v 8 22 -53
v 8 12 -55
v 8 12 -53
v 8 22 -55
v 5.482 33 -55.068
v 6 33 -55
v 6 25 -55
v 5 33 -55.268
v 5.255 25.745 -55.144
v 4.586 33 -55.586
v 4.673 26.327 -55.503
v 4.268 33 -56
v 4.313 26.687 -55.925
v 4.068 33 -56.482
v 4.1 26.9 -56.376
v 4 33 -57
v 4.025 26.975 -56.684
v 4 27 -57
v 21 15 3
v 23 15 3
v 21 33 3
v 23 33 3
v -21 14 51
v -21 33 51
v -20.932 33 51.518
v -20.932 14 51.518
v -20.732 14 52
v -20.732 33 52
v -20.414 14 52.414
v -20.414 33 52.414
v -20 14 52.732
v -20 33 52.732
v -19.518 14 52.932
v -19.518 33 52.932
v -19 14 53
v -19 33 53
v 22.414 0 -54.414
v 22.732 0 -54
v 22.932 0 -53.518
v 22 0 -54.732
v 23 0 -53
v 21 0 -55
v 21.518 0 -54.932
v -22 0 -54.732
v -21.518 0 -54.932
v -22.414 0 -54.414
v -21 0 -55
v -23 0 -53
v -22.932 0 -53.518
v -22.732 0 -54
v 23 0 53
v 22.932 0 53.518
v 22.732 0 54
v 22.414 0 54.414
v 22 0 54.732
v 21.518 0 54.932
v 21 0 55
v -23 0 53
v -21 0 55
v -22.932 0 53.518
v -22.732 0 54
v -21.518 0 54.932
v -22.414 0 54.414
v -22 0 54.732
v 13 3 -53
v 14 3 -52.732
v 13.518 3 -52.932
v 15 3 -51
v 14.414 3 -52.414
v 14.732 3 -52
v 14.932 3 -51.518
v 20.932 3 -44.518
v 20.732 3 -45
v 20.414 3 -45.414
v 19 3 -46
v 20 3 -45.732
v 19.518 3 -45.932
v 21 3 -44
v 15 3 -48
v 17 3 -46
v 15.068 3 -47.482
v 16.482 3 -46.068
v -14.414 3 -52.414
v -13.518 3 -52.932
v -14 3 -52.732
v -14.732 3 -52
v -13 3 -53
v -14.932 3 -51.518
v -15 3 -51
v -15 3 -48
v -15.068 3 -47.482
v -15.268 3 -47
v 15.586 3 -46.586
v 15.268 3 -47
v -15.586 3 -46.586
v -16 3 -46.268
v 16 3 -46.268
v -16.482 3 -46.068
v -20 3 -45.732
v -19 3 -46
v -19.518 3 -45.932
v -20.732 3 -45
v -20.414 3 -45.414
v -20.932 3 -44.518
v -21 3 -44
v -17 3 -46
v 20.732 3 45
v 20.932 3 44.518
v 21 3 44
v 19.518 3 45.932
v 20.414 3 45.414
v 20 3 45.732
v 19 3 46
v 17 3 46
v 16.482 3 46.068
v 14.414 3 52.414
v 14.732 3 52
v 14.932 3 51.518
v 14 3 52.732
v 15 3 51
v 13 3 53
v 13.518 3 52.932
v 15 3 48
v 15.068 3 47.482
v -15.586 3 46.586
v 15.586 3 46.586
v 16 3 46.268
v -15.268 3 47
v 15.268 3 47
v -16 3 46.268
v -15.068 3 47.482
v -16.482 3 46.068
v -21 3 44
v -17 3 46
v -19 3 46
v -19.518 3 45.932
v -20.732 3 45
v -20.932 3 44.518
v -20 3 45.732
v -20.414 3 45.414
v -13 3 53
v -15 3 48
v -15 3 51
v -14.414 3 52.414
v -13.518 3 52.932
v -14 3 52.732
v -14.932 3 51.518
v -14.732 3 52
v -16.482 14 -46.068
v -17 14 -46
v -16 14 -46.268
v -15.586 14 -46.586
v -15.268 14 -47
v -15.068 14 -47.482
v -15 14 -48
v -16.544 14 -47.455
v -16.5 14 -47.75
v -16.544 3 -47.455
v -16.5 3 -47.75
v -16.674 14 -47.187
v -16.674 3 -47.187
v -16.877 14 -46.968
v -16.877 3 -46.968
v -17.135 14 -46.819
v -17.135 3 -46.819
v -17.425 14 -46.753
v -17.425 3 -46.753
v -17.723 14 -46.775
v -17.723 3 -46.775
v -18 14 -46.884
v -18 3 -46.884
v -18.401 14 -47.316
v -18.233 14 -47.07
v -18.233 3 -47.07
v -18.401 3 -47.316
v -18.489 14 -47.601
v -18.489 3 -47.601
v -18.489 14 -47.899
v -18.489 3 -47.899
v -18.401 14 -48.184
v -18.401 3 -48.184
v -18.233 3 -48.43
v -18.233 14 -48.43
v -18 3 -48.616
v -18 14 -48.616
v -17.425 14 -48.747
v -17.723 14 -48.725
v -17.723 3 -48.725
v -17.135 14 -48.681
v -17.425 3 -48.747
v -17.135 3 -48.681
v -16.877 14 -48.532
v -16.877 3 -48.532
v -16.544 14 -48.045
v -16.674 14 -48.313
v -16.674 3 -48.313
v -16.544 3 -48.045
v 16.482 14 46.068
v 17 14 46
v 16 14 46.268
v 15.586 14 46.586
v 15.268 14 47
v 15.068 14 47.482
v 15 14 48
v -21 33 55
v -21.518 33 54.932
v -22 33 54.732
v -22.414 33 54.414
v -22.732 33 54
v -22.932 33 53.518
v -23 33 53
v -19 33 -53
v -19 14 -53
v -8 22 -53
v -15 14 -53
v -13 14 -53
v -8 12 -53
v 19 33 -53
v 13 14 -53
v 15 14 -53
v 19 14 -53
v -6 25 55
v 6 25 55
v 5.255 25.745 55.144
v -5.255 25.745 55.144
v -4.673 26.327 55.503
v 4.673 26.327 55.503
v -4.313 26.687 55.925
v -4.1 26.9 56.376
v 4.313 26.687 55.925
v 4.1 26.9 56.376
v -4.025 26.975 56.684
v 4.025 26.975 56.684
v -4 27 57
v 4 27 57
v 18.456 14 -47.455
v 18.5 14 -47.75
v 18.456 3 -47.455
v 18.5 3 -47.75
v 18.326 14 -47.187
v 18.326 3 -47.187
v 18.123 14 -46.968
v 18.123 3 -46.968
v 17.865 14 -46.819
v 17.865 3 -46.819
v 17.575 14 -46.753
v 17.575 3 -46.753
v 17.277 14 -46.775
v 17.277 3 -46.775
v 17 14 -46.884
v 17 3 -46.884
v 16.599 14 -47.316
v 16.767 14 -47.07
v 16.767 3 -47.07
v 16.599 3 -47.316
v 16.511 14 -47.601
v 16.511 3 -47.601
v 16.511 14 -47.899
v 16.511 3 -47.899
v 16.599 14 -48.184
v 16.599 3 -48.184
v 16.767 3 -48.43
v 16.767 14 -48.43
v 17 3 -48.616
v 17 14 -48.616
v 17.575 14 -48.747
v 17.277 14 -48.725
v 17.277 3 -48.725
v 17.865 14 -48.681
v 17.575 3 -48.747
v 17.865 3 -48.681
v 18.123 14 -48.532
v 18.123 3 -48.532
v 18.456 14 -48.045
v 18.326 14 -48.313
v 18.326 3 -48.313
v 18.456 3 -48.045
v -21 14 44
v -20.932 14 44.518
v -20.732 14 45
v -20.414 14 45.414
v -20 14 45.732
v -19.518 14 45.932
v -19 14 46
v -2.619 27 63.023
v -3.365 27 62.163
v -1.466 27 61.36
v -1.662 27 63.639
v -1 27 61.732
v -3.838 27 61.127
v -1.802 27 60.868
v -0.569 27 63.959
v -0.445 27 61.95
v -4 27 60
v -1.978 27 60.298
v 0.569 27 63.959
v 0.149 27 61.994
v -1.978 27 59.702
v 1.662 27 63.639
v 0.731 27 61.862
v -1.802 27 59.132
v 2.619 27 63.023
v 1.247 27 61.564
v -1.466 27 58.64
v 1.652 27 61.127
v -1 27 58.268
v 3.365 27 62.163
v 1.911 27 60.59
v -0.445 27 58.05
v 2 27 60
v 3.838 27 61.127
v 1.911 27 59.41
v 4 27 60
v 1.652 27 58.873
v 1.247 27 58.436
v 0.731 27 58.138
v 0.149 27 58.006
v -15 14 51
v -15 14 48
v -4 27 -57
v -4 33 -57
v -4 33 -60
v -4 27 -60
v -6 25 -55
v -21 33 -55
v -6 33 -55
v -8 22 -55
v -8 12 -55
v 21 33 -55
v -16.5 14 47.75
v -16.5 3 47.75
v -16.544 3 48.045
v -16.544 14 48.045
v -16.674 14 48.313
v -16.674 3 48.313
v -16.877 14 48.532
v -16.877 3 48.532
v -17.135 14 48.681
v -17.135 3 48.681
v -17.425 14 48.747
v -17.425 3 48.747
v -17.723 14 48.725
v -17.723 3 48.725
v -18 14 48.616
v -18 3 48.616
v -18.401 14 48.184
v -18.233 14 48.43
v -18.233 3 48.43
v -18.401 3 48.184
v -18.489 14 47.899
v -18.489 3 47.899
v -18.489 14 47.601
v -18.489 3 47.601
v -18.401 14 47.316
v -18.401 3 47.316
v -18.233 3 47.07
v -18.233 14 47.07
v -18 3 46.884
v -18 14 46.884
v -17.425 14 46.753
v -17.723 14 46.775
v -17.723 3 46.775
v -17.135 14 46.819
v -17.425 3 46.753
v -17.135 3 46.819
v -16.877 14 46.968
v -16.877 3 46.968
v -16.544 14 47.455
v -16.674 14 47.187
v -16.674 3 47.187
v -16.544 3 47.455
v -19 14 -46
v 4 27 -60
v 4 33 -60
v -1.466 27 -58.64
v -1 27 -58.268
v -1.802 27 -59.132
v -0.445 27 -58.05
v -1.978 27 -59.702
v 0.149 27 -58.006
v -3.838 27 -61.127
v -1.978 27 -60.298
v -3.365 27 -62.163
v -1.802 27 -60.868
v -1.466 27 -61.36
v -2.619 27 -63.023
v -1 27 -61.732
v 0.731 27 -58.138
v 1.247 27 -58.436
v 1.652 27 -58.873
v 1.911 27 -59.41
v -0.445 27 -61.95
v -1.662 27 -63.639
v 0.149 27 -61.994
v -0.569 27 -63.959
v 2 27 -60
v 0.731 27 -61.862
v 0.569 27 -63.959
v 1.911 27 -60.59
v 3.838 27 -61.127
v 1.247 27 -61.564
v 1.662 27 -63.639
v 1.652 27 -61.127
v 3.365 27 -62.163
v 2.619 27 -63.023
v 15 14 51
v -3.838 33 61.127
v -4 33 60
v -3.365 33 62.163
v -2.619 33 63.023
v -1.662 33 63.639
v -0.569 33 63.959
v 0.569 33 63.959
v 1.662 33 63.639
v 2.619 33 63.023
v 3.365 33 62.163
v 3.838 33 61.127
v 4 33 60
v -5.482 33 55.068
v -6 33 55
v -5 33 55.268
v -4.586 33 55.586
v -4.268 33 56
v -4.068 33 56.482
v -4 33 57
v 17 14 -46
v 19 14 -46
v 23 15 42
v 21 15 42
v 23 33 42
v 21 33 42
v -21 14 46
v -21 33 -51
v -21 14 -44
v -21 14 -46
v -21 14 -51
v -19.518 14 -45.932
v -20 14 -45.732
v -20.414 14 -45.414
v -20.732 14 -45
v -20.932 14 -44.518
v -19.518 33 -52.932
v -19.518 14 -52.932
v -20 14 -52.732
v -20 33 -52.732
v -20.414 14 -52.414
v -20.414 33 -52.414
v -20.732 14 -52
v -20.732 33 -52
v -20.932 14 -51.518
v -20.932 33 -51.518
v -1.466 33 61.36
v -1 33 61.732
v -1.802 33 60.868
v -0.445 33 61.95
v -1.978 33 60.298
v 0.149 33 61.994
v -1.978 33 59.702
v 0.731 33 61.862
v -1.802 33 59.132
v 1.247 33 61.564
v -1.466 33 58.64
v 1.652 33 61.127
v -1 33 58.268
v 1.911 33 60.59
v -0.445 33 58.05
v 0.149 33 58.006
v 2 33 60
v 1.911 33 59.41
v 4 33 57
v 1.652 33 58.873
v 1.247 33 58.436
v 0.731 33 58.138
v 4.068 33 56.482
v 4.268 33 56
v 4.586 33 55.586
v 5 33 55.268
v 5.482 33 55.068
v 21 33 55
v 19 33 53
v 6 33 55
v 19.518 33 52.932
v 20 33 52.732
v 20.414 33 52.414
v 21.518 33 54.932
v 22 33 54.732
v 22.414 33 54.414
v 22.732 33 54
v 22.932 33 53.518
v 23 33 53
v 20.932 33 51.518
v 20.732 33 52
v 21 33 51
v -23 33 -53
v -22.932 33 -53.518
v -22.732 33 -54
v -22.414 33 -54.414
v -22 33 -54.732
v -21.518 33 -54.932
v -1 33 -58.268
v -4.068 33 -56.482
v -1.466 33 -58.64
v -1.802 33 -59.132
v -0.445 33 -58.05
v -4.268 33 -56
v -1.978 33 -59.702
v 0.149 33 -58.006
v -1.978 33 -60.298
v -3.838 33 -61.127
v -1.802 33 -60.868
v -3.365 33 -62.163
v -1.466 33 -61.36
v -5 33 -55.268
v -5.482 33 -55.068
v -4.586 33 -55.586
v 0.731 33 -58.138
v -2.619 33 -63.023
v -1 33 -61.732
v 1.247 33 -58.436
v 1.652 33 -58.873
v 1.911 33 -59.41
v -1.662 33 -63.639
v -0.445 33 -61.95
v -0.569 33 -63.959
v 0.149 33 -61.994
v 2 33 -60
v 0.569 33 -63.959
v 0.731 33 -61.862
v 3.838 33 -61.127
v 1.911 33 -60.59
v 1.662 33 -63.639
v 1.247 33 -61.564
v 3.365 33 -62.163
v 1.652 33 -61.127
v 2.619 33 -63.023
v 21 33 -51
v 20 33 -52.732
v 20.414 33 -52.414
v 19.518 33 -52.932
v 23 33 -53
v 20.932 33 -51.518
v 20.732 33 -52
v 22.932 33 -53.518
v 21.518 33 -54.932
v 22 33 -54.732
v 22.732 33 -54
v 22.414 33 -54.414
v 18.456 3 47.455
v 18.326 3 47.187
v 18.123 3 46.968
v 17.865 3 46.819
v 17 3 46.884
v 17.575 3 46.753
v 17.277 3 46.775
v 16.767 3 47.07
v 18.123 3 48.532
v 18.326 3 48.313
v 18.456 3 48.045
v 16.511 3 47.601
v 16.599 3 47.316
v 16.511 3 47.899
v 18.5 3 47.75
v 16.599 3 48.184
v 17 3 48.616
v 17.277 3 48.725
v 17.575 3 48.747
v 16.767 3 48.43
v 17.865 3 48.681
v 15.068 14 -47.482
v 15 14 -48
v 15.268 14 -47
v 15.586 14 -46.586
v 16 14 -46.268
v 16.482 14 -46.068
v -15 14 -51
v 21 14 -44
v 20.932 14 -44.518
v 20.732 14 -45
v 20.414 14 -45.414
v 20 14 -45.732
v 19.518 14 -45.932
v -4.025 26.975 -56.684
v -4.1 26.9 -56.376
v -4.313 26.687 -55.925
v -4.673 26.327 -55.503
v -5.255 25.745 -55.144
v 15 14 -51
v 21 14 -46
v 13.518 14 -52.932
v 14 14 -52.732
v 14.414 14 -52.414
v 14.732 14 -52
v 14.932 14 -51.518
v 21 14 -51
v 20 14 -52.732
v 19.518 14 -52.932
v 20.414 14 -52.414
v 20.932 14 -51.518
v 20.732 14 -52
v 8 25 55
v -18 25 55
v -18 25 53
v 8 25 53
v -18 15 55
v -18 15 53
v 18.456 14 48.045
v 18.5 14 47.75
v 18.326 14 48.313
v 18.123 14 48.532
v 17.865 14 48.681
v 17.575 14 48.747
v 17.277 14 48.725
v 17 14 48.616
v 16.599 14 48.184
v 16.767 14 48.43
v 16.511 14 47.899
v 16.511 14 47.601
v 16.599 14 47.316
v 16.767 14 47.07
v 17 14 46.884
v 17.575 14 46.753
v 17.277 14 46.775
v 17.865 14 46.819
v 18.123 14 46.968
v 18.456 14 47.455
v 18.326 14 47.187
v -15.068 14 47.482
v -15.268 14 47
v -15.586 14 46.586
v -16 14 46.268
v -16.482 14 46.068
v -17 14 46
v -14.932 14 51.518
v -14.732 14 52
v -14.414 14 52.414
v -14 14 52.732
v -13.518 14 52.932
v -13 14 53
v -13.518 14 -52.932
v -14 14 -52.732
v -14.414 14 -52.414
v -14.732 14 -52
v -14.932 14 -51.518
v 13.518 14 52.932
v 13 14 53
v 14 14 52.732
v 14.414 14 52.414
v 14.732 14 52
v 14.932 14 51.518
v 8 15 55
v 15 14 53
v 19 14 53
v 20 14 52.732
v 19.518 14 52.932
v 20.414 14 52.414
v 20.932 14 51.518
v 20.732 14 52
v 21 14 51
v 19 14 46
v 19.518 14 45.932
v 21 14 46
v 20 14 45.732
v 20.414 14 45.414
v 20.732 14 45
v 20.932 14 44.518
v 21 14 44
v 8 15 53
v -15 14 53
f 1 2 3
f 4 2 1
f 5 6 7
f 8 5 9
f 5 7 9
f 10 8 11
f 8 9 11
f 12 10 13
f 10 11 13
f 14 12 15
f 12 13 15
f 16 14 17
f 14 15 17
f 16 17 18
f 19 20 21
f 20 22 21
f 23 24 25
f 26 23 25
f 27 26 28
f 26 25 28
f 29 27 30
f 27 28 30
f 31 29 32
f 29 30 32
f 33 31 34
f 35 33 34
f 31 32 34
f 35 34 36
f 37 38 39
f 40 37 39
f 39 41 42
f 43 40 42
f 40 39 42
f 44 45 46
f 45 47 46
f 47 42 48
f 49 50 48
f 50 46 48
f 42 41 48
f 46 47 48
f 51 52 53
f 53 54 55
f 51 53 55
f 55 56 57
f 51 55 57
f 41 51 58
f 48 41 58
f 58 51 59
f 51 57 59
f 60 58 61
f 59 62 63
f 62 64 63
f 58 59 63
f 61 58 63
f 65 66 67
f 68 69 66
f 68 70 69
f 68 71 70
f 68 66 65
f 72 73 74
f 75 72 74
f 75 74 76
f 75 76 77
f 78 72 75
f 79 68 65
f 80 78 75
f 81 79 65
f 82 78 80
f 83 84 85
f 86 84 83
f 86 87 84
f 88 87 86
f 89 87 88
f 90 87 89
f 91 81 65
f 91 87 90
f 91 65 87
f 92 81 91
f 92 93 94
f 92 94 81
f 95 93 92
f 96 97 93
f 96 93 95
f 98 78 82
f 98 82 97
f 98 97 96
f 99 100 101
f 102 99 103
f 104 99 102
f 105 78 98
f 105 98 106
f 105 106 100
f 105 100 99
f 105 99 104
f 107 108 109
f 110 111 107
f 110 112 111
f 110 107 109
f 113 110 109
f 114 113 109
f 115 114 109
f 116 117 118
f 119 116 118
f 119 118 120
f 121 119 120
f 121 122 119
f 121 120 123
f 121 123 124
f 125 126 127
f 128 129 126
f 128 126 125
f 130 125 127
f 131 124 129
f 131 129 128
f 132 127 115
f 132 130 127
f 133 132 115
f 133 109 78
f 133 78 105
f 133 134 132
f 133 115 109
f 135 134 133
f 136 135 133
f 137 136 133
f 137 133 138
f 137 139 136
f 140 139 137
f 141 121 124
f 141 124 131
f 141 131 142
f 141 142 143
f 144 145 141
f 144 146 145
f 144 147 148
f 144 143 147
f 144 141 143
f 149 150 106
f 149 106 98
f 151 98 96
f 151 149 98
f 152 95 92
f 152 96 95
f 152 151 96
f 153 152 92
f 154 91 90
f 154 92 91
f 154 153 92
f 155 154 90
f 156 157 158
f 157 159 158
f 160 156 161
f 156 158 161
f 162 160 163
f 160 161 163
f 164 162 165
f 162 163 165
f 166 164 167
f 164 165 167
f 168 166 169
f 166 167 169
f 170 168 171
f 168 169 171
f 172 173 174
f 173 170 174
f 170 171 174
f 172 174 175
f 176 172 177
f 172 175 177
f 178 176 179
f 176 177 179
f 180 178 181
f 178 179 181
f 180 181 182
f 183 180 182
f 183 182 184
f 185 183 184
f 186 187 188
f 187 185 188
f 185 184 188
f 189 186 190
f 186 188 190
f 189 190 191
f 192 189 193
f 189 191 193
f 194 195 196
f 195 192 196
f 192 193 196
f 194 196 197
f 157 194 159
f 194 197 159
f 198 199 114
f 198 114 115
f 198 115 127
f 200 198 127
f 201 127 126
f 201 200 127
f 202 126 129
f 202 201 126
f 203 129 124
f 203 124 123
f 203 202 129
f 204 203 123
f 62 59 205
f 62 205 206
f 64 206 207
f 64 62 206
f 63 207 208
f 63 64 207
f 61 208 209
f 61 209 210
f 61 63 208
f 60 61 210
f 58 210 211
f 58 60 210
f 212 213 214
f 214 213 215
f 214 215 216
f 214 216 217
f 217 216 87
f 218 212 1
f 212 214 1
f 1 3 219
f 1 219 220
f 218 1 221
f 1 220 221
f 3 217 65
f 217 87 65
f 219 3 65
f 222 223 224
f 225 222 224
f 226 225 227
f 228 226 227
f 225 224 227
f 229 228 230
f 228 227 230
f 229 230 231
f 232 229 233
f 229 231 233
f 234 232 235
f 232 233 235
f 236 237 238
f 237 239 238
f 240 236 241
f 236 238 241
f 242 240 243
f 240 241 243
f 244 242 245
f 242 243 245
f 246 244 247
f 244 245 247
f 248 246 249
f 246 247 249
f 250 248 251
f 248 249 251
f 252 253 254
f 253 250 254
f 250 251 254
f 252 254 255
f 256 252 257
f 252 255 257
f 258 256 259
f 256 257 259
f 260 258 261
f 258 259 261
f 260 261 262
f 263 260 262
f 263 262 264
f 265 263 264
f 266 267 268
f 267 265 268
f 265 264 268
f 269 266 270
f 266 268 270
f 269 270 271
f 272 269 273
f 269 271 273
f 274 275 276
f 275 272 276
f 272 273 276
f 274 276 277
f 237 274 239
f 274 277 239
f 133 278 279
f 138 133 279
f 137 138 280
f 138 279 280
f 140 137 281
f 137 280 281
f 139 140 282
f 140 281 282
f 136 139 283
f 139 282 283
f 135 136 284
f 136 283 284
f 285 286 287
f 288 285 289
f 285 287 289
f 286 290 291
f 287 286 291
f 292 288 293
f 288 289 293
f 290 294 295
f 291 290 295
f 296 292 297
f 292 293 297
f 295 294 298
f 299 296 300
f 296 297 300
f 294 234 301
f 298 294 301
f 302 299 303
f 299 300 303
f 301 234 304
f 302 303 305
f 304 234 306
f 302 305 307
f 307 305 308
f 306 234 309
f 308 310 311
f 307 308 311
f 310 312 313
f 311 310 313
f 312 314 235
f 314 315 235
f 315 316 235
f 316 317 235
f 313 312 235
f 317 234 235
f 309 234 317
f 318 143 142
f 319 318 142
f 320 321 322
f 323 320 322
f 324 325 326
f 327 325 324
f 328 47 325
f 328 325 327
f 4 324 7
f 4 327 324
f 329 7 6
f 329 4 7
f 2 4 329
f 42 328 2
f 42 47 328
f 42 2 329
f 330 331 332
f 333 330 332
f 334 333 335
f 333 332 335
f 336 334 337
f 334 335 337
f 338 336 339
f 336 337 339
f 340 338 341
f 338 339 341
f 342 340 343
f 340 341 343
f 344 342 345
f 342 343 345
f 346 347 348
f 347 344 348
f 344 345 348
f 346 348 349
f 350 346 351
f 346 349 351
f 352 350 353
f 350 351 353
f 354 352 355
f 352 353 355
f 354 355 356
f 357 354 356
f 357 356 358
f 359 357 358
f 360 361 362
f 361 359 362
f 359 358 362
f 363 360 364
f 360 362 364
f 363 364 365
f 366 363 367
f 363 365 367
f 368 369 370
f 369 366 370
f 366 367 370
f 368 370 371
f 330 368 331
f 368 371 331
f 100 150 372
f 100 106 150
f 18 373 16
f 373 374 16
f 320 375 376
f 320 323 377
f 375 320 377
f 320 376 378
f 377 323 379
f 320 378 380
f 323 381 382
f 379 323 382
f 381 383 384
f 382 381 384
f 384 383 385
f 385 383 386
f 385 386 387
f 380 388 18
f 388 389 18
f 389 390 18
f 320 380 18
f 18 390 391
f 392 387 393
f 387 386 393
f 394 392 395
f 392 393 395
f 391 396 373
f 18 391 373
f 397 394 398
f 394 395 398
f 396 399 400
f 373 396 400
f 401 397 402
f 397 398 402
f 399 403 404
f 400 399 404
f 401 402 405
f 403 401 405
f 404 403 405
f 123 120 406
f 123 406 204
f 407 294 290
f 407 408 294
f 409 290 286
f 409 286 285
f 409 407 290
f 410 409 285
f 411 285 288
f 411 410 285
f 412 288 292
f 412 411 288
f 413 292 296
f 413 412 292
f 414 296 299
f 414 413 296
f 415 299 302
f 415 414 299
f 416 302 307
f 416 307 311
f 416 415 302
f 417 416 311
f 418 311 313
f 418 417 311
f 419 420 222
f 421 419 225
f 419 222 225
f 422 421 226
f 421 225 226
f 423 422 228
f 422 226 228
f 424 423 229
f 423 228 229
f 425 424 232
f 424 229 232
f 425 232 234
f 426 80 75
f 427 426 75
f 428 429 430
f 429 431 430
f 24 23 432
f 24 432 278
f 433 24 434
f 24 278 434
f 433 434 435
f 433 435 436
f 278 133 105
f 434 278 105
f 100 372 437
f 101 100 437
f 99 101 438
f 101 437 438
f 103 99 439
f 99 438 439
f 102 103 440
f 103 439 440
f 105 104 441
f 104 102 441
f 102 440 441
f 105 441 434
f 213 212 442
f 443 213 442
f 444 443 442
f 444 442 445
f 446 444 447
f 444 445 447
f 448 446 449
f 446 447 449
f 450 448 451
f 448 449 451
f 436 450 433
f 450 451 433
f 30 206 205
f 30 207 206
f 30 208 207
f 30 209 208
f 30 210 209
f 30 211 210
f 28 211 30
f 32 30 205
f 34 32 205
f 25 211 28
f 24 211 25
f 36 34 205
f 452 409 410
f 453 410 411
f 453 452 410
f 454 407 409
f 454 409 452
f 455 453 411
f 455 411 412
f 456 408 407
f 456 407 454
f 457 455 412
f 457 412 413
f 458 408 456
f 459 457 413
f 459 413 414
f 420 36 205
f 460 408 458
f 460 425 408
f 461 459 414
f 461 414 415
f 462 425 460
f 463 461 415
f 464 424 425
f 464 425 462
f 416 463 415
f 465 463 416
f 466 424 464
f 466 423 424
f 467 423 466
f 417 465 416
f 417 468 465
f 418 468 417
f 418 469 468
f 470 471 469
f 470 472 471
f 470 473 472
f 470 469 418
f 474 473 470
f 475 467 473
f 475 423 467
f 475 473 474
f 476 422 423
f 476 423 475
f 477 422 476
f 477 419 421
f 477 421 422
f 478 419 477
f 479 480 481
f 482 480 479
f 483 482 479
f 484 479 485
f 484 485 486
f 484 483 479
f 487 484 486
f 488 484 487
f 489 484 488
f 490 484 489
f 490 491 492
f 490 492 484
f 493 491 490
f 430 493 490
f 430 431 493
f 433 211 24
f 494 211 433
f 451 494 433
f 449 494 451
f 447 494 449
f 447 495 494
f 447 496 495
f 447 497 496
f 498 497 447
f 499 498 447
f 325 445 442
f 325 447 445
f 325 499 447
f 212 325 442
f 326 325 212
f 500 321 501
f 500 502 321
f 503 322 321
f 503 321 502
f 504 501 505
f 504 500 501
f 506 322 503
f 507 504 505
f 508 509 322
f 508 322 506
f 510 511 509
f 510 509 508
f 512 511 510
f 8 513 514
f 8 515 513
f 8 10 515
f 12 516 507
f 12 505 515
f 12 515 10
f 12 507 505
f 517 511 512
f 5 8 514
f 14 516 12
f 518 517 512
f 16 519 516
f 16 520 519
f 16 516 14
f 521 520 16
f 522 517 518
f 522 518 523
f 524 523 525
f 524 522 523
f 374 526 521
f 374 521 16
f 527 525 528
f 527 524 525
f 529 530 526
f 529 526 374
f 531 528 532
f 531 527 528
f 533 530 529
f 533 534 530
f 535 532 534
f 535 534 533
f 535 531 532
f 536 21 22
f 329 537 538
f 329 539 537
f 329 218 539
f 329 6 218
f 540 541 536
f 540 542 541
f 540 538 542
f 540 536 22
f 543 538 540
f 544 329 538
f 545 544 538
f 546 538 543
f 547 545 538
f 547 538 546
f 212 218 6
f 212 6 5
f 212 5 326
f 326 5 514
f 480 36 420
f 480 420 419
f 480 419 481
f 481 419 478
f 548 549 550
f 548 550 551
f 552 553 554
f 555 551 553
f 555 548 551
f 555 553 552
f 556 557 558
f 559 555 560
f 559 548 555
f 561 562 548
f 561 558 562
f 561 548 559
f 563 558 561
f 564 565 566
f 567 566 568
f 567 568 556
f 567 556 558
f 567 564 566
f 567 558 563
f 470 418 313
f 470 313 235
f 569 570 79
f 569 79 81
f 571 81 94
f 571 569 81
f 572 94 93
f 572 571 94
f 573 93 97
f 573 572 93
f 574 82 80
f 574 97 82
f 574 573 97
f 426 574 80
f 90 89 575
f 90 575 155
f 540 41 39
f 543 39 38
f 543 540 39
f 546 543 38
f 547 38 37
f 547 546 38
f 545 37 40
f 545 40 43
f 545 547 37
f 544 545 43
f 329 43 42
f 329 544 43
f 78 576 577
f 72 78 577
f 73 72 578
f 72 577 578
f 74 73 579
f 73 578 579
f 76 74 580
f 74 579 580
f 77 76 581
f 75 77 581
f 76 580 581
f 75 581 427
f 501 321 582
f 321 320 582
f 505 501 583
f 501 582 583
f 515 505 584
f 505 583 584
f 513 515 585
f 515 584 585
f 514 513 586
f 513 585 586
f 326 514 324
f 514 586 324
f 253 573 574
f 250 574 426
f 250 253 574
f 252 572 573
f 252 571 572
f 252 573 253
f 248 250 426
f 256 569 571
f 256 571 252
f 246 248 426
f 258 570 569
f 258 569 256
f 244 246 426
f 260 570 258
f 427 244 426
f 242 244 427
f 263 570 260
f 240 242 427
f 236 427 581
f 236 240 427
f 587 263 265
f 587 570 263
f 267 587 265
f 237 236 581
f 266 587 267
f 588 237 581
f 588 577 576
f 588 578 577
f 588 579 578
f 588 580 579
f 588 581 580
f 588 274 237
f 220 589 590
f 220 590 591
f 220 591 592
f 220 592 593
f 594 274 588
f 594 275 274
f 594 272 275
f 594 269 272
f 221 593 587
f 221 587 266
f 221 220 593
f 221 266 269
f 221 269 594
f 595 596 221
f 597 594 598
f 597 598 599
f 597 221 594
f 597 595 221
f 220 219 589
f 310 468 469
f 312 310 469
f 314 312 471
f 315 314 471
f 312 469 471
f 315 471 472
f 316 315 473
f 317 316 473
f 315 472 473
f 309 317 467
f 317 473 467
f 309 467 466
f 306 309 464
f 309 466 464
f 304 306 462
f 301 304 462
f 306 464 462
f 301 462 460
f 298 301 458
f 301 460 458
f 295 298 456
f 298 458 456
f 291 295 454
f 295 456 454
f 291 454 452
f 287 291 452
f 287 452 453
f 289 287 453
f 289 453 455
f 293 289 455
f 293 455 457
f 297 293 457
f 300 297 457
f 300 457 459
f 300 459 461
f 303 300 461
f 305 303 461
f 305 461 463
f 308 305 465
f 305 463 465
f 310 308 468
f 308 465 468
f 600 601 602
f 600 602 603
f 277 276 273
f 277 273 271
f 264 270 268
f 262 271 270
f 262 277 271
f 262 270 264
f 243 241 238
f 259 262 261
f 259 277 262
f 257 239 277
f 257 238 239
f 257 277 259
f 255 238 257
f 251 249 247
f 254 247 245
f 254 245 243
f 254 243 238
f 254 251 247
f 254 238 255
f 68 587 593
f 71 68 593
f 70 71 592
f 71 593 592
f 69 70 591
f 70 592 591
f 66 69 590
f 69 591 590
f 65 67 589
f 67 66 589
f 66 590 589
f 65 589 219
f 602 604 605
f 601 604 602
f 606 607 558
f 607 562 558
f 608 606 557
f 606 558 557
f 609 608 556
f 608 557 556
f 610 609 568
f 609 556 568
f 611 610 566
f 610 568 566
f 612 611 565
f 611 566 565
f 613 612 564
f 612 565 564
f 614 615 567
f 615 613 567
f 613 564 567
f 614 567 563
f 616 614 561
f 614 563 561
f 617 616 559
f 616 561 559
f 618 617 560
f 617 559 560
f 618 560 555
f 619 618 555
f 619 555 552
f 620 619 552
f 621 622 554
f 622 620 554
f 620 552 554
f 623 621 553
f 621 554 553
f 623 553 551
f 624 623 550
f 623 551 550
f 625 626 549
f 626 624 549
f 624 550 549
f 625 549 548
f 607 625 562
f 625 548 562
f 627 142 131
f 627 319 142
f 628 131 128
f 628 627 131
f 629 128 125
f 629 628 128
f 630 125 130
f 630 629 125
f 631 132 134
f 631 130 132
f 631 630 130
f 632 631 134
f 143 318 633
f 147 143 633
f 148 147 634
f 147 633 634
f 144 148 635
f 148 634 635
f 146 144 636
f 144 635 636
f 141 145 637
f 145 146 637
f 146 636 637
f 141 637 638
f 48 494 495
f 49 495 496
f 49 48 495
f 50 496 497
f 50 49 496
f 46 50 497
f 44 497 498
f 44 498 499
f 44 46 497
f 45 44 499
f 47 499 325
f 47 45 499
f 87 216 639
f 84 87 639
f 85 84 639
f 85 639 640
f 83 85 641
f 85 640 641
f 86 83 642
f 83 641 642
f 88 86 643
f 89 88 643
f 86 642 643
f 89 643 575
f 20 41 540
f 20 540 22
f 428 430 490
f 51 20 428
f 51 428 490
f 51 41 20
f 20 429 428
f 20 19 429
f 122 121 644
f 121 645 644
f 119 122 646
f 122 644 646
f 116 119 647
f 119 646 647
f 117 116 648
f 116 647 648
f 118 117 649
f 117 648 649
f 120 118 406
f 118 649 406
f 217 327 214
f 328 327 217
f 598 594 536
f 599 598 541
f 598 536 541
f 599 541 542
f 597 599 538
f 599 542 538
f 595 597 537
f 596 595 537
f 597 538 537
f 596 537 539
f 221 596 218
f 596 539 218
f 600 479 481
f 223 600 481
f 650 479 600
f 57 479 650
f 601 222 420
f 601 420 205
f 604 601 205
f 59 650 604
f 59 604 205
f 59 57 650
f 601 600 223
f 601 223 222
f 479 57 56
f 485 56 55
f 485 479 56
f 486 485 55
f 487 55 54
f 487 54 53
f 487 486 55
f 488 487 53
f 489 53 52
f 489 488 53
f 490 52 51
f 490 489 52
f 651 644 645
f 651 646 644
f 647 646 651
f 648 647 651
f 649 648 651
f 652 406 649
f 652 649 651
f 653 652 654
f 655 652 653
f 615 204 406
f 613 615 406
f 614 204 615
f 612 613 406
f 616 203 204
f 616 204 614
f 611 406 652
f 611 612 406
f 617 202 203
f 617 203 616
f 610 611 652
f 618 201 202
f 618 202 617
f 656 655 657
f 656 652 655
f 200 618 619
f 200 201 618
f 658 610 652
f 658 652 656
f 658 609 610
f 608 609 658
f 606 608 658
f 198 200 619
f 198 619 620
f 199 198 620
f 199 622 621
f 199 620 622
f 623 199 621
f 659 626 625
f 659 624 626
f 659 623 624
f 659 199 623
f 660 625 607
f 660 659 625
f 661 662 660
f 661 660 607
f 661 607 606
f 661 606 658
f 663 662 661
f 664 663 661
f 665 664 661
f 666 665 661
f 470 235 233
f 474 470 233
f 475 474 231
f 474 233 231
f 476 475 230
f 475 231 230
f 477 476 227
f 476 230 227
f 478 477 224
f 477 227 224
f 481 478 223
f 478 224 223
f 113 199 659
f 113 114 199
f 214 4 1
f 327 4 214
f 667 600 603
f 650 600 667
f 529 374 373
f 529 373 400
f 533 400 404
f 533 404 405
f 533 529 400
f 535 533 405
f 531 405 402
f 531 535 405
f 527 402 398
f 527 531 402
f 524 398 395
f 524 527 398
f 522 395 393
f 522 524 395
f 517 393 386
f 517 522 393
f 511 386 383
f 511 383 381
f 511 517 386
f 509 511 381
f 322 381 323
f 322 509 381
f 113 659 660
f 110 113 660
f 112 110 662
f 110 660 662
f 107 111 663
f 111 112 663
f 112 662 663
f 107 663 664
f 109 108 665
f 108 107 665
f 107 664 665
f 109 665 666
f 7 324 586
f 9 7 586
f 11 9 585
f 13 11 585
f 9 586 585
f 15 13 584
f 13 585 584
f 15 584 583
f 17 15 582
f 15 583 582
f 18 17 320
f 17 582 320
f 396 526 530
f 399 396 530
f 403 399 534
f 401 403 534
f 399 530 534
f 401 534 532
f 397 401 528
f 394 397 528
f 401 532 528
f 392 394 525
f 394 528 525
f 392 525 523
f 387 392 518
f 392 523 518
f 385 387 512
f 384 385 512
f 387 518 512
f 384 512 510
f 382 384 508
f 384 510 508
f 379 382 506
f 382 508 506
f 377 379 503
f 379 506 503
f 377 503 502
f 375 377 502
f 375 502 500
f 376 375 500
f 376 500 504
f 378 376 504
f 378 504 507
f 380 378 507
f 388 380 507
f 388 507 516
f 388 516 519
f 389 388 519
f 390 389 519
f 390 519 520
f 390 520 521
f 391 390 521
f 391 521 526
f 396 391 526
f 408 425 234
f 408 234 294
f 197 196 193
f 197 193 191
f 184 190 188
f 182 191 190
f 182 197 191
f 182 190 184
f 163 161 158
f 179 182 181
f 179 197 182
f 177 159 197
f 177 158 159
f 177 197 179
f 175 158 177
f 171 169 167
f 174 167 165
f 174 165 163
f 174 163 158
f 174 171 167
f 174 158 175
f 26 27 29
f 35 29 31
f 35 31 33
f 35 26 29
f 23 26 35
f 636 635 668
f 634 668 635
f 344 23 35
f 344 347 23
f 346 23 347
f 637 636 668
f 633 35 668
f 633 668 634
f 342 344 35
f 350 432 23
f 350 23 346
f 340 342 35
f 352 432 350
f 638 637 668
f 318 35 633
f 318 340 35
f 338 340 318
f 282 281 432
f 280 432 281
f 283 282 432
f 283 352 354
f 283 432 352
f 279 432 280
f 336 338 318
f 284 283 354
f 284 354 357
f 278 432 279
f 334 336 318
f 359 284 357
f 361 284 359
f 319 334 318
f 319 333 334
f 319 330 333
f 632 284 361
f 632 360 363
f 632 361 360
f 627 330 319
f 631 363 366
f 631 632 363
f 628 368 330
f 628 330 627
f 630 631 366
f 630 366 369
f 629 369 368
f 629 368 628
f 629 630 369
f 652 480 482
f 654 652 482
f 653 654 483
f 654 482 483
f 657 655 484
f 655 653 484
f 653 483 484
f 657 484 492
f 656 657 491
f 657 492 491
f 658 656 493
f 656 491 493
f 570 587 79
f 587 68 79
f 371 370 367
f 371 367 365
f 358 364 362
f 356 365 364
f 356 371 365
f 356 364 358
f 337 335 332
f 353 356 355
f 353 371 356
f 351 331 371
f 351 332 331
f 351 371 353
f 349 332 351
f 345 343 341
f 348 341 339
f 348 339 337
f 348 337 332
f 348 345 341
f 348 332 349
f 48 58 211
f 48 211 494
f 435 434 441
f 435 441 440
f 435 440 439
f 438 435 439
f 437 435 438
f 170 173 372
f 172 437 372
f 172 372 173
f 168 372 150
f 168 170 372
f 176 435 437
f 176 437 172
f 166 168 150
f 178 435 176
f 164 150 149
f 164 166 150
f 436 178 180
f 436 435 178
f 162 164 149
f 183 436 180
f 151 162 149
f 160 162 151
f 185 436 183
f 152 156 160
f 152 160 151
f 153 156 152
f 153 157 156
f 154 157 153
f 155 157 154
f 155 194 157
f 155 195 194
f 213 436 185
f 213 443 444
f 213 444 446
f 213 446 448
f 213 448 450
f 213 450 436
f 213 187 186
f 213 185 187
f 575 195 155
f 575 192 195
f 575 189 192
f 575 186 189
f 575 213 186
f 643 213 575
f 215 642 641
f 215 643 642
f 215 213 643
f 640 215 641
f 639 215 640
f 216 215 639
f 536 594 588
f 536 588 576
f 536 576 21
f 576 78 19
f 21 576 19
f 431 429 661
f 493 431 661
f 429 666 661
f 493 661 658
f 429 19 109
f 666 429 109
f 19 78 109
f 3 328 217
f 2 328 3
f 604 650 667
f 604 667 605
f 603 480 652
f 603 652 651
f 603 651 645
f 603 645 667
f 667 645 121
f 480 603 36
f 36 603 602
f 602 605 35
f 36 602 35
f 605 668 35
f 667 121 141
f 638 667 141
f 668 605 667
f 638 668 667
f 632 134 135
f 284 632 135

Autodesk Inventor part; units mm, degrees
ref_plane "YZ Plane" through (0, 0, 0) normal (1, 0, 0) x (0, 1, 0)
ref_plane "XZ Plane" through (0, 0, 0) normal (0, 1, 0) x (-1, 0, 0)
ref_plane "XY Plane" through (0, 0, 0) normal (0, 0, 1) x (1, 0, 0)
sketch "Sketch1" plane through (0, 0, 0) normal (0, 1, 0) x (-1, 0, 0)
  line L0 (-23, 55) -> (23, 55)
  line L1 (23, 55) -> (23, -55)
  line L2 (23, -55) -> (-23, -55)
  line L3 (-23, -55) -> (-23, 55)
  line L4 (-23, 55) -> (23, -55) construction
  line L5 (23, 55) -> (-23, -55) construction
  point P0 (0, 0)
  dimension "d0" = 46
  dimension "d1" = 110
extrude "Extrusion1" add sketch "Sketch1" along normal blind 3
sketch "Sketch2" plane through (0, 3, 0) normal (0, 1, 0) x (1, 0, 0)
  line L0 (-23, 55) -> (-23, -55) projected
  line L1 (23, -55) -> (-23, -55)
  line L2 (-23, -55) -> (-23, 55)
  line L3 (-23, 55) -> (23, 55)
  line L4 (23, 55) -> (23, -55)
  line L5 (23, -55) -> (-23, 55) construction
  line L6 (-23, -55) -> (23, 55) construction
  line L7 (21, -53) -> (-21, -53)
  line L8 (-21, -53) -> (-21, 53)
  line L9 (-21, 53) -> (21, 53)
  line L10 (21, 53) -> (21, -53)
  line L11 (21, -53) -> (-21, 53) construction
  line L12 (-21, -53) -> (21, 53) construction
  point P0 (0, 0)
  dimension "d4" = 42
  dimension "d5" = 106
extrude "Extrusion2" add sketch "Sketch2" along normal blind 30
sketch "Sketch5" plane through (0, 33, 0) normal (0, 1, 0) x (1, 0, 0)
  line L0 (23, 55) -> (-23, 55) projected
  line L1 (23, -55) -> (23, 55) projected
  line L2 (-23, 55) -> (-23, -55) projected
  line L3 (21, 53) -> (21, -53) projected
  line L4 (21, -42) -> (23, -42)
  line L5 (23, -42) -> (23, -3)
  line L6 (23, -3) -> (21, -3)
  line L7 (21, -3) -> (21, -42)
  line L8 (-23, -55) -> (23, -55) projected
  point P0 (0, 0)
  point P1 (22, -42)
  point P2 (22, -3)
  dimension "d24" = 13
  dimension "d25" = 58
extrude "Extrusion5" cut sketch "Sketch5" against normal blind 18 contours L1 L4 L3 L6
sketch "Sketch6" plane through (23, 0, -55) normal (0, 0, -1) x (-1, 0, 0)
  line L0 (15, 22) -> (31, 22)
  line L1 (31, 22) -> (31, 12)
  line L2 (31, 12) -> (15, 12)
  line L3 (15, 12) -> (15, 22)
  line L4 (46, 0) -> (46, 33) projected
  line L5 (0, 0) -> (46, 0) projected
  point P0 (23, 0)
  dimension "d28" = 16
  dimension "d29" = 15
  dimension "d30" = 10
  dimension "d32" = 12
extrude "Extrusion6" cut sketch "Sketch6" against normal blind 15
sketch "Sketch7" plane through (-23, 0, 55) normal (0, 0, 1) x (1, 0, 0)
  line L0 (5, 25) -> (31, 25)
  line L1 (31, 25) -> (31, 15)
  line L2 (31, 15) -> (5, 15)
  line L3 (5, 15) -> (5, 25)
  line L4 (0, 0) -> (0, 33) projected
  line L5 (0, 0) -> (46, 0) projected
  point P0 (23, 0)
  dimension "d35" = 5
  dimension "d36" = 10
  dimension "d37" = 15
  dimension "d38" = 26
extrude "Extrusion7" cut sketch "Sketch7" against normal blind 15
sketch "Sketch9" plane through (0, 33, 0) normal (0, 1, 0) x (1, 0, 0)
  circle A0 centre (0, -60) radius 2
  line L0 (-23, -55) -> (23, -55) projected
  line L1 (4, -55) -> (-4, -55)
  line L2 (-4, -55) -> (-4, -60)
  line L3 (4, -60) -> (4, -55)
  arc A1 (-4, -60) -> (4, -60) centre (0, -60) ccw
  circle A2 centre (0, 60) radius 2
  line L4 (23, 55) -> (-23, 55) projected
  line L5 (4, 55) -> (-4, 55)
  line L6 (-4, 55) -> (-4, 60)
  line L7 (4, 60) -> (4, 55)
  arc A3 (4, 60) -> (-4, 60) centre (0, 60) ccw
  point P0 (0, 0)
  point P1 (0, -55)
  point P2 (0, -55)
  point P3 (0, 55)
  point P4 (0, 55)
  point P5 (0, 55)
  dimension "d77" = 4
  dimension "d78" = 5
  dimension "d79" = 8
  dimension "d80" = 4
  dimension "d81" = 4
  dimension "d82" = 4
  dimension "d83" = 5
  dimension "d84" = 8
  dimension "d85" = 4
extrude "Extrusion10" add sketch "Sketch9" against normal blind 6
fillet "Fillet2" radius 2 6 edges at (-4, 30, -55) (4, 30, -55) (-4, 30, 55) (4, 30, 55) (0, 27, -55) (0, 27, 55)
sketch "Sketch11" plane through (0, 3, 0) normal (0, 1, 0) x (1, 0, 0)
  circle A0 centre (-17.5, 47.75) radius 1
  circle A1 centre (17.5, 47.75) radius 1
  circle A2 centre (-17.5, -47.75) radius 1
  circle A3 centre (17.5, -47.75) radius 1
  line L0 (-21, 53) -> (-21, -53) projected
  line L1 (-21, 53) -> (-15, 53)
  line L2 (-15, 53) -> (-15, 46)
  line L3 (-15, 46) -> (-21, 46)
  line L4 (-21, 46) -> (-21, 53)
  line L5 (21, 53) -> (-21, 53) projected
  line L6 (21, 53) -> (15, 53)
  line L7 (15, 53) -> (15, 46)
  line L8 (15, 46) -> (21, 46)
  line L9 (21, 46) -> (21, 53)
  line L10 (-21, -53) -> (-15, -53)
  line L11 (-15, -53) -> (-15, -46)
  line L12 (-15, -46) -> (-21, -46)
  line L13 (-21, -46) -> (-21, -53)
  line L14 (21, -53) -> (15, -53)
  line L15 (15, -53) -> (15, -46)
  line L16 (15, -46) -> (21, -46)
  line L17 (21, -46) -> (21, -53)
  point P0 (0, 0)
  dimension "d95" = 2
  dimension "d96" = 2
  dimension "d97" = 2
  dimension "d98" = 2
  dimension "d99" = 95.5
  dimension "d100" = 35
  dimension "d101" = 47.75
  dimension "d102" = 17.5
  dimension "d103" = 6
  dimension "d104" = 7
  dimension "d105" = 6
  dimension "d106" = 7
  dimension "d107" = 6
  dimension "d108" = 7
  dimension "d109" = 6
  dimension "d110" = 7
extrude "Extrusion11" add sketch "Sketch11" along normal blind 11
fillet "Fillet6" radius 2 20 edges at (-23, 16.5, -55) (-23, 16.5, 55) (23, 16.5, 55) (23, 16.5, -55) (21, 23.5, -53) (-21, 23.5, -53) (-21, 23.5, 53) (21, 23.5, 53) (15, 8.5, -46) (-15, 8.5, -46) (15, 8.5, 46) (-15, 8.5, 46) (21, 8.5, -46) (15, 8.5, -53) (-15, 8.5, -53) (-21, 8.5, -46) (-21, 8.5, 46) (-15, 8.5, 53) (21, 8.5, 46) (15, 8.5, 53)
properties part number "StereoPiBracket"
